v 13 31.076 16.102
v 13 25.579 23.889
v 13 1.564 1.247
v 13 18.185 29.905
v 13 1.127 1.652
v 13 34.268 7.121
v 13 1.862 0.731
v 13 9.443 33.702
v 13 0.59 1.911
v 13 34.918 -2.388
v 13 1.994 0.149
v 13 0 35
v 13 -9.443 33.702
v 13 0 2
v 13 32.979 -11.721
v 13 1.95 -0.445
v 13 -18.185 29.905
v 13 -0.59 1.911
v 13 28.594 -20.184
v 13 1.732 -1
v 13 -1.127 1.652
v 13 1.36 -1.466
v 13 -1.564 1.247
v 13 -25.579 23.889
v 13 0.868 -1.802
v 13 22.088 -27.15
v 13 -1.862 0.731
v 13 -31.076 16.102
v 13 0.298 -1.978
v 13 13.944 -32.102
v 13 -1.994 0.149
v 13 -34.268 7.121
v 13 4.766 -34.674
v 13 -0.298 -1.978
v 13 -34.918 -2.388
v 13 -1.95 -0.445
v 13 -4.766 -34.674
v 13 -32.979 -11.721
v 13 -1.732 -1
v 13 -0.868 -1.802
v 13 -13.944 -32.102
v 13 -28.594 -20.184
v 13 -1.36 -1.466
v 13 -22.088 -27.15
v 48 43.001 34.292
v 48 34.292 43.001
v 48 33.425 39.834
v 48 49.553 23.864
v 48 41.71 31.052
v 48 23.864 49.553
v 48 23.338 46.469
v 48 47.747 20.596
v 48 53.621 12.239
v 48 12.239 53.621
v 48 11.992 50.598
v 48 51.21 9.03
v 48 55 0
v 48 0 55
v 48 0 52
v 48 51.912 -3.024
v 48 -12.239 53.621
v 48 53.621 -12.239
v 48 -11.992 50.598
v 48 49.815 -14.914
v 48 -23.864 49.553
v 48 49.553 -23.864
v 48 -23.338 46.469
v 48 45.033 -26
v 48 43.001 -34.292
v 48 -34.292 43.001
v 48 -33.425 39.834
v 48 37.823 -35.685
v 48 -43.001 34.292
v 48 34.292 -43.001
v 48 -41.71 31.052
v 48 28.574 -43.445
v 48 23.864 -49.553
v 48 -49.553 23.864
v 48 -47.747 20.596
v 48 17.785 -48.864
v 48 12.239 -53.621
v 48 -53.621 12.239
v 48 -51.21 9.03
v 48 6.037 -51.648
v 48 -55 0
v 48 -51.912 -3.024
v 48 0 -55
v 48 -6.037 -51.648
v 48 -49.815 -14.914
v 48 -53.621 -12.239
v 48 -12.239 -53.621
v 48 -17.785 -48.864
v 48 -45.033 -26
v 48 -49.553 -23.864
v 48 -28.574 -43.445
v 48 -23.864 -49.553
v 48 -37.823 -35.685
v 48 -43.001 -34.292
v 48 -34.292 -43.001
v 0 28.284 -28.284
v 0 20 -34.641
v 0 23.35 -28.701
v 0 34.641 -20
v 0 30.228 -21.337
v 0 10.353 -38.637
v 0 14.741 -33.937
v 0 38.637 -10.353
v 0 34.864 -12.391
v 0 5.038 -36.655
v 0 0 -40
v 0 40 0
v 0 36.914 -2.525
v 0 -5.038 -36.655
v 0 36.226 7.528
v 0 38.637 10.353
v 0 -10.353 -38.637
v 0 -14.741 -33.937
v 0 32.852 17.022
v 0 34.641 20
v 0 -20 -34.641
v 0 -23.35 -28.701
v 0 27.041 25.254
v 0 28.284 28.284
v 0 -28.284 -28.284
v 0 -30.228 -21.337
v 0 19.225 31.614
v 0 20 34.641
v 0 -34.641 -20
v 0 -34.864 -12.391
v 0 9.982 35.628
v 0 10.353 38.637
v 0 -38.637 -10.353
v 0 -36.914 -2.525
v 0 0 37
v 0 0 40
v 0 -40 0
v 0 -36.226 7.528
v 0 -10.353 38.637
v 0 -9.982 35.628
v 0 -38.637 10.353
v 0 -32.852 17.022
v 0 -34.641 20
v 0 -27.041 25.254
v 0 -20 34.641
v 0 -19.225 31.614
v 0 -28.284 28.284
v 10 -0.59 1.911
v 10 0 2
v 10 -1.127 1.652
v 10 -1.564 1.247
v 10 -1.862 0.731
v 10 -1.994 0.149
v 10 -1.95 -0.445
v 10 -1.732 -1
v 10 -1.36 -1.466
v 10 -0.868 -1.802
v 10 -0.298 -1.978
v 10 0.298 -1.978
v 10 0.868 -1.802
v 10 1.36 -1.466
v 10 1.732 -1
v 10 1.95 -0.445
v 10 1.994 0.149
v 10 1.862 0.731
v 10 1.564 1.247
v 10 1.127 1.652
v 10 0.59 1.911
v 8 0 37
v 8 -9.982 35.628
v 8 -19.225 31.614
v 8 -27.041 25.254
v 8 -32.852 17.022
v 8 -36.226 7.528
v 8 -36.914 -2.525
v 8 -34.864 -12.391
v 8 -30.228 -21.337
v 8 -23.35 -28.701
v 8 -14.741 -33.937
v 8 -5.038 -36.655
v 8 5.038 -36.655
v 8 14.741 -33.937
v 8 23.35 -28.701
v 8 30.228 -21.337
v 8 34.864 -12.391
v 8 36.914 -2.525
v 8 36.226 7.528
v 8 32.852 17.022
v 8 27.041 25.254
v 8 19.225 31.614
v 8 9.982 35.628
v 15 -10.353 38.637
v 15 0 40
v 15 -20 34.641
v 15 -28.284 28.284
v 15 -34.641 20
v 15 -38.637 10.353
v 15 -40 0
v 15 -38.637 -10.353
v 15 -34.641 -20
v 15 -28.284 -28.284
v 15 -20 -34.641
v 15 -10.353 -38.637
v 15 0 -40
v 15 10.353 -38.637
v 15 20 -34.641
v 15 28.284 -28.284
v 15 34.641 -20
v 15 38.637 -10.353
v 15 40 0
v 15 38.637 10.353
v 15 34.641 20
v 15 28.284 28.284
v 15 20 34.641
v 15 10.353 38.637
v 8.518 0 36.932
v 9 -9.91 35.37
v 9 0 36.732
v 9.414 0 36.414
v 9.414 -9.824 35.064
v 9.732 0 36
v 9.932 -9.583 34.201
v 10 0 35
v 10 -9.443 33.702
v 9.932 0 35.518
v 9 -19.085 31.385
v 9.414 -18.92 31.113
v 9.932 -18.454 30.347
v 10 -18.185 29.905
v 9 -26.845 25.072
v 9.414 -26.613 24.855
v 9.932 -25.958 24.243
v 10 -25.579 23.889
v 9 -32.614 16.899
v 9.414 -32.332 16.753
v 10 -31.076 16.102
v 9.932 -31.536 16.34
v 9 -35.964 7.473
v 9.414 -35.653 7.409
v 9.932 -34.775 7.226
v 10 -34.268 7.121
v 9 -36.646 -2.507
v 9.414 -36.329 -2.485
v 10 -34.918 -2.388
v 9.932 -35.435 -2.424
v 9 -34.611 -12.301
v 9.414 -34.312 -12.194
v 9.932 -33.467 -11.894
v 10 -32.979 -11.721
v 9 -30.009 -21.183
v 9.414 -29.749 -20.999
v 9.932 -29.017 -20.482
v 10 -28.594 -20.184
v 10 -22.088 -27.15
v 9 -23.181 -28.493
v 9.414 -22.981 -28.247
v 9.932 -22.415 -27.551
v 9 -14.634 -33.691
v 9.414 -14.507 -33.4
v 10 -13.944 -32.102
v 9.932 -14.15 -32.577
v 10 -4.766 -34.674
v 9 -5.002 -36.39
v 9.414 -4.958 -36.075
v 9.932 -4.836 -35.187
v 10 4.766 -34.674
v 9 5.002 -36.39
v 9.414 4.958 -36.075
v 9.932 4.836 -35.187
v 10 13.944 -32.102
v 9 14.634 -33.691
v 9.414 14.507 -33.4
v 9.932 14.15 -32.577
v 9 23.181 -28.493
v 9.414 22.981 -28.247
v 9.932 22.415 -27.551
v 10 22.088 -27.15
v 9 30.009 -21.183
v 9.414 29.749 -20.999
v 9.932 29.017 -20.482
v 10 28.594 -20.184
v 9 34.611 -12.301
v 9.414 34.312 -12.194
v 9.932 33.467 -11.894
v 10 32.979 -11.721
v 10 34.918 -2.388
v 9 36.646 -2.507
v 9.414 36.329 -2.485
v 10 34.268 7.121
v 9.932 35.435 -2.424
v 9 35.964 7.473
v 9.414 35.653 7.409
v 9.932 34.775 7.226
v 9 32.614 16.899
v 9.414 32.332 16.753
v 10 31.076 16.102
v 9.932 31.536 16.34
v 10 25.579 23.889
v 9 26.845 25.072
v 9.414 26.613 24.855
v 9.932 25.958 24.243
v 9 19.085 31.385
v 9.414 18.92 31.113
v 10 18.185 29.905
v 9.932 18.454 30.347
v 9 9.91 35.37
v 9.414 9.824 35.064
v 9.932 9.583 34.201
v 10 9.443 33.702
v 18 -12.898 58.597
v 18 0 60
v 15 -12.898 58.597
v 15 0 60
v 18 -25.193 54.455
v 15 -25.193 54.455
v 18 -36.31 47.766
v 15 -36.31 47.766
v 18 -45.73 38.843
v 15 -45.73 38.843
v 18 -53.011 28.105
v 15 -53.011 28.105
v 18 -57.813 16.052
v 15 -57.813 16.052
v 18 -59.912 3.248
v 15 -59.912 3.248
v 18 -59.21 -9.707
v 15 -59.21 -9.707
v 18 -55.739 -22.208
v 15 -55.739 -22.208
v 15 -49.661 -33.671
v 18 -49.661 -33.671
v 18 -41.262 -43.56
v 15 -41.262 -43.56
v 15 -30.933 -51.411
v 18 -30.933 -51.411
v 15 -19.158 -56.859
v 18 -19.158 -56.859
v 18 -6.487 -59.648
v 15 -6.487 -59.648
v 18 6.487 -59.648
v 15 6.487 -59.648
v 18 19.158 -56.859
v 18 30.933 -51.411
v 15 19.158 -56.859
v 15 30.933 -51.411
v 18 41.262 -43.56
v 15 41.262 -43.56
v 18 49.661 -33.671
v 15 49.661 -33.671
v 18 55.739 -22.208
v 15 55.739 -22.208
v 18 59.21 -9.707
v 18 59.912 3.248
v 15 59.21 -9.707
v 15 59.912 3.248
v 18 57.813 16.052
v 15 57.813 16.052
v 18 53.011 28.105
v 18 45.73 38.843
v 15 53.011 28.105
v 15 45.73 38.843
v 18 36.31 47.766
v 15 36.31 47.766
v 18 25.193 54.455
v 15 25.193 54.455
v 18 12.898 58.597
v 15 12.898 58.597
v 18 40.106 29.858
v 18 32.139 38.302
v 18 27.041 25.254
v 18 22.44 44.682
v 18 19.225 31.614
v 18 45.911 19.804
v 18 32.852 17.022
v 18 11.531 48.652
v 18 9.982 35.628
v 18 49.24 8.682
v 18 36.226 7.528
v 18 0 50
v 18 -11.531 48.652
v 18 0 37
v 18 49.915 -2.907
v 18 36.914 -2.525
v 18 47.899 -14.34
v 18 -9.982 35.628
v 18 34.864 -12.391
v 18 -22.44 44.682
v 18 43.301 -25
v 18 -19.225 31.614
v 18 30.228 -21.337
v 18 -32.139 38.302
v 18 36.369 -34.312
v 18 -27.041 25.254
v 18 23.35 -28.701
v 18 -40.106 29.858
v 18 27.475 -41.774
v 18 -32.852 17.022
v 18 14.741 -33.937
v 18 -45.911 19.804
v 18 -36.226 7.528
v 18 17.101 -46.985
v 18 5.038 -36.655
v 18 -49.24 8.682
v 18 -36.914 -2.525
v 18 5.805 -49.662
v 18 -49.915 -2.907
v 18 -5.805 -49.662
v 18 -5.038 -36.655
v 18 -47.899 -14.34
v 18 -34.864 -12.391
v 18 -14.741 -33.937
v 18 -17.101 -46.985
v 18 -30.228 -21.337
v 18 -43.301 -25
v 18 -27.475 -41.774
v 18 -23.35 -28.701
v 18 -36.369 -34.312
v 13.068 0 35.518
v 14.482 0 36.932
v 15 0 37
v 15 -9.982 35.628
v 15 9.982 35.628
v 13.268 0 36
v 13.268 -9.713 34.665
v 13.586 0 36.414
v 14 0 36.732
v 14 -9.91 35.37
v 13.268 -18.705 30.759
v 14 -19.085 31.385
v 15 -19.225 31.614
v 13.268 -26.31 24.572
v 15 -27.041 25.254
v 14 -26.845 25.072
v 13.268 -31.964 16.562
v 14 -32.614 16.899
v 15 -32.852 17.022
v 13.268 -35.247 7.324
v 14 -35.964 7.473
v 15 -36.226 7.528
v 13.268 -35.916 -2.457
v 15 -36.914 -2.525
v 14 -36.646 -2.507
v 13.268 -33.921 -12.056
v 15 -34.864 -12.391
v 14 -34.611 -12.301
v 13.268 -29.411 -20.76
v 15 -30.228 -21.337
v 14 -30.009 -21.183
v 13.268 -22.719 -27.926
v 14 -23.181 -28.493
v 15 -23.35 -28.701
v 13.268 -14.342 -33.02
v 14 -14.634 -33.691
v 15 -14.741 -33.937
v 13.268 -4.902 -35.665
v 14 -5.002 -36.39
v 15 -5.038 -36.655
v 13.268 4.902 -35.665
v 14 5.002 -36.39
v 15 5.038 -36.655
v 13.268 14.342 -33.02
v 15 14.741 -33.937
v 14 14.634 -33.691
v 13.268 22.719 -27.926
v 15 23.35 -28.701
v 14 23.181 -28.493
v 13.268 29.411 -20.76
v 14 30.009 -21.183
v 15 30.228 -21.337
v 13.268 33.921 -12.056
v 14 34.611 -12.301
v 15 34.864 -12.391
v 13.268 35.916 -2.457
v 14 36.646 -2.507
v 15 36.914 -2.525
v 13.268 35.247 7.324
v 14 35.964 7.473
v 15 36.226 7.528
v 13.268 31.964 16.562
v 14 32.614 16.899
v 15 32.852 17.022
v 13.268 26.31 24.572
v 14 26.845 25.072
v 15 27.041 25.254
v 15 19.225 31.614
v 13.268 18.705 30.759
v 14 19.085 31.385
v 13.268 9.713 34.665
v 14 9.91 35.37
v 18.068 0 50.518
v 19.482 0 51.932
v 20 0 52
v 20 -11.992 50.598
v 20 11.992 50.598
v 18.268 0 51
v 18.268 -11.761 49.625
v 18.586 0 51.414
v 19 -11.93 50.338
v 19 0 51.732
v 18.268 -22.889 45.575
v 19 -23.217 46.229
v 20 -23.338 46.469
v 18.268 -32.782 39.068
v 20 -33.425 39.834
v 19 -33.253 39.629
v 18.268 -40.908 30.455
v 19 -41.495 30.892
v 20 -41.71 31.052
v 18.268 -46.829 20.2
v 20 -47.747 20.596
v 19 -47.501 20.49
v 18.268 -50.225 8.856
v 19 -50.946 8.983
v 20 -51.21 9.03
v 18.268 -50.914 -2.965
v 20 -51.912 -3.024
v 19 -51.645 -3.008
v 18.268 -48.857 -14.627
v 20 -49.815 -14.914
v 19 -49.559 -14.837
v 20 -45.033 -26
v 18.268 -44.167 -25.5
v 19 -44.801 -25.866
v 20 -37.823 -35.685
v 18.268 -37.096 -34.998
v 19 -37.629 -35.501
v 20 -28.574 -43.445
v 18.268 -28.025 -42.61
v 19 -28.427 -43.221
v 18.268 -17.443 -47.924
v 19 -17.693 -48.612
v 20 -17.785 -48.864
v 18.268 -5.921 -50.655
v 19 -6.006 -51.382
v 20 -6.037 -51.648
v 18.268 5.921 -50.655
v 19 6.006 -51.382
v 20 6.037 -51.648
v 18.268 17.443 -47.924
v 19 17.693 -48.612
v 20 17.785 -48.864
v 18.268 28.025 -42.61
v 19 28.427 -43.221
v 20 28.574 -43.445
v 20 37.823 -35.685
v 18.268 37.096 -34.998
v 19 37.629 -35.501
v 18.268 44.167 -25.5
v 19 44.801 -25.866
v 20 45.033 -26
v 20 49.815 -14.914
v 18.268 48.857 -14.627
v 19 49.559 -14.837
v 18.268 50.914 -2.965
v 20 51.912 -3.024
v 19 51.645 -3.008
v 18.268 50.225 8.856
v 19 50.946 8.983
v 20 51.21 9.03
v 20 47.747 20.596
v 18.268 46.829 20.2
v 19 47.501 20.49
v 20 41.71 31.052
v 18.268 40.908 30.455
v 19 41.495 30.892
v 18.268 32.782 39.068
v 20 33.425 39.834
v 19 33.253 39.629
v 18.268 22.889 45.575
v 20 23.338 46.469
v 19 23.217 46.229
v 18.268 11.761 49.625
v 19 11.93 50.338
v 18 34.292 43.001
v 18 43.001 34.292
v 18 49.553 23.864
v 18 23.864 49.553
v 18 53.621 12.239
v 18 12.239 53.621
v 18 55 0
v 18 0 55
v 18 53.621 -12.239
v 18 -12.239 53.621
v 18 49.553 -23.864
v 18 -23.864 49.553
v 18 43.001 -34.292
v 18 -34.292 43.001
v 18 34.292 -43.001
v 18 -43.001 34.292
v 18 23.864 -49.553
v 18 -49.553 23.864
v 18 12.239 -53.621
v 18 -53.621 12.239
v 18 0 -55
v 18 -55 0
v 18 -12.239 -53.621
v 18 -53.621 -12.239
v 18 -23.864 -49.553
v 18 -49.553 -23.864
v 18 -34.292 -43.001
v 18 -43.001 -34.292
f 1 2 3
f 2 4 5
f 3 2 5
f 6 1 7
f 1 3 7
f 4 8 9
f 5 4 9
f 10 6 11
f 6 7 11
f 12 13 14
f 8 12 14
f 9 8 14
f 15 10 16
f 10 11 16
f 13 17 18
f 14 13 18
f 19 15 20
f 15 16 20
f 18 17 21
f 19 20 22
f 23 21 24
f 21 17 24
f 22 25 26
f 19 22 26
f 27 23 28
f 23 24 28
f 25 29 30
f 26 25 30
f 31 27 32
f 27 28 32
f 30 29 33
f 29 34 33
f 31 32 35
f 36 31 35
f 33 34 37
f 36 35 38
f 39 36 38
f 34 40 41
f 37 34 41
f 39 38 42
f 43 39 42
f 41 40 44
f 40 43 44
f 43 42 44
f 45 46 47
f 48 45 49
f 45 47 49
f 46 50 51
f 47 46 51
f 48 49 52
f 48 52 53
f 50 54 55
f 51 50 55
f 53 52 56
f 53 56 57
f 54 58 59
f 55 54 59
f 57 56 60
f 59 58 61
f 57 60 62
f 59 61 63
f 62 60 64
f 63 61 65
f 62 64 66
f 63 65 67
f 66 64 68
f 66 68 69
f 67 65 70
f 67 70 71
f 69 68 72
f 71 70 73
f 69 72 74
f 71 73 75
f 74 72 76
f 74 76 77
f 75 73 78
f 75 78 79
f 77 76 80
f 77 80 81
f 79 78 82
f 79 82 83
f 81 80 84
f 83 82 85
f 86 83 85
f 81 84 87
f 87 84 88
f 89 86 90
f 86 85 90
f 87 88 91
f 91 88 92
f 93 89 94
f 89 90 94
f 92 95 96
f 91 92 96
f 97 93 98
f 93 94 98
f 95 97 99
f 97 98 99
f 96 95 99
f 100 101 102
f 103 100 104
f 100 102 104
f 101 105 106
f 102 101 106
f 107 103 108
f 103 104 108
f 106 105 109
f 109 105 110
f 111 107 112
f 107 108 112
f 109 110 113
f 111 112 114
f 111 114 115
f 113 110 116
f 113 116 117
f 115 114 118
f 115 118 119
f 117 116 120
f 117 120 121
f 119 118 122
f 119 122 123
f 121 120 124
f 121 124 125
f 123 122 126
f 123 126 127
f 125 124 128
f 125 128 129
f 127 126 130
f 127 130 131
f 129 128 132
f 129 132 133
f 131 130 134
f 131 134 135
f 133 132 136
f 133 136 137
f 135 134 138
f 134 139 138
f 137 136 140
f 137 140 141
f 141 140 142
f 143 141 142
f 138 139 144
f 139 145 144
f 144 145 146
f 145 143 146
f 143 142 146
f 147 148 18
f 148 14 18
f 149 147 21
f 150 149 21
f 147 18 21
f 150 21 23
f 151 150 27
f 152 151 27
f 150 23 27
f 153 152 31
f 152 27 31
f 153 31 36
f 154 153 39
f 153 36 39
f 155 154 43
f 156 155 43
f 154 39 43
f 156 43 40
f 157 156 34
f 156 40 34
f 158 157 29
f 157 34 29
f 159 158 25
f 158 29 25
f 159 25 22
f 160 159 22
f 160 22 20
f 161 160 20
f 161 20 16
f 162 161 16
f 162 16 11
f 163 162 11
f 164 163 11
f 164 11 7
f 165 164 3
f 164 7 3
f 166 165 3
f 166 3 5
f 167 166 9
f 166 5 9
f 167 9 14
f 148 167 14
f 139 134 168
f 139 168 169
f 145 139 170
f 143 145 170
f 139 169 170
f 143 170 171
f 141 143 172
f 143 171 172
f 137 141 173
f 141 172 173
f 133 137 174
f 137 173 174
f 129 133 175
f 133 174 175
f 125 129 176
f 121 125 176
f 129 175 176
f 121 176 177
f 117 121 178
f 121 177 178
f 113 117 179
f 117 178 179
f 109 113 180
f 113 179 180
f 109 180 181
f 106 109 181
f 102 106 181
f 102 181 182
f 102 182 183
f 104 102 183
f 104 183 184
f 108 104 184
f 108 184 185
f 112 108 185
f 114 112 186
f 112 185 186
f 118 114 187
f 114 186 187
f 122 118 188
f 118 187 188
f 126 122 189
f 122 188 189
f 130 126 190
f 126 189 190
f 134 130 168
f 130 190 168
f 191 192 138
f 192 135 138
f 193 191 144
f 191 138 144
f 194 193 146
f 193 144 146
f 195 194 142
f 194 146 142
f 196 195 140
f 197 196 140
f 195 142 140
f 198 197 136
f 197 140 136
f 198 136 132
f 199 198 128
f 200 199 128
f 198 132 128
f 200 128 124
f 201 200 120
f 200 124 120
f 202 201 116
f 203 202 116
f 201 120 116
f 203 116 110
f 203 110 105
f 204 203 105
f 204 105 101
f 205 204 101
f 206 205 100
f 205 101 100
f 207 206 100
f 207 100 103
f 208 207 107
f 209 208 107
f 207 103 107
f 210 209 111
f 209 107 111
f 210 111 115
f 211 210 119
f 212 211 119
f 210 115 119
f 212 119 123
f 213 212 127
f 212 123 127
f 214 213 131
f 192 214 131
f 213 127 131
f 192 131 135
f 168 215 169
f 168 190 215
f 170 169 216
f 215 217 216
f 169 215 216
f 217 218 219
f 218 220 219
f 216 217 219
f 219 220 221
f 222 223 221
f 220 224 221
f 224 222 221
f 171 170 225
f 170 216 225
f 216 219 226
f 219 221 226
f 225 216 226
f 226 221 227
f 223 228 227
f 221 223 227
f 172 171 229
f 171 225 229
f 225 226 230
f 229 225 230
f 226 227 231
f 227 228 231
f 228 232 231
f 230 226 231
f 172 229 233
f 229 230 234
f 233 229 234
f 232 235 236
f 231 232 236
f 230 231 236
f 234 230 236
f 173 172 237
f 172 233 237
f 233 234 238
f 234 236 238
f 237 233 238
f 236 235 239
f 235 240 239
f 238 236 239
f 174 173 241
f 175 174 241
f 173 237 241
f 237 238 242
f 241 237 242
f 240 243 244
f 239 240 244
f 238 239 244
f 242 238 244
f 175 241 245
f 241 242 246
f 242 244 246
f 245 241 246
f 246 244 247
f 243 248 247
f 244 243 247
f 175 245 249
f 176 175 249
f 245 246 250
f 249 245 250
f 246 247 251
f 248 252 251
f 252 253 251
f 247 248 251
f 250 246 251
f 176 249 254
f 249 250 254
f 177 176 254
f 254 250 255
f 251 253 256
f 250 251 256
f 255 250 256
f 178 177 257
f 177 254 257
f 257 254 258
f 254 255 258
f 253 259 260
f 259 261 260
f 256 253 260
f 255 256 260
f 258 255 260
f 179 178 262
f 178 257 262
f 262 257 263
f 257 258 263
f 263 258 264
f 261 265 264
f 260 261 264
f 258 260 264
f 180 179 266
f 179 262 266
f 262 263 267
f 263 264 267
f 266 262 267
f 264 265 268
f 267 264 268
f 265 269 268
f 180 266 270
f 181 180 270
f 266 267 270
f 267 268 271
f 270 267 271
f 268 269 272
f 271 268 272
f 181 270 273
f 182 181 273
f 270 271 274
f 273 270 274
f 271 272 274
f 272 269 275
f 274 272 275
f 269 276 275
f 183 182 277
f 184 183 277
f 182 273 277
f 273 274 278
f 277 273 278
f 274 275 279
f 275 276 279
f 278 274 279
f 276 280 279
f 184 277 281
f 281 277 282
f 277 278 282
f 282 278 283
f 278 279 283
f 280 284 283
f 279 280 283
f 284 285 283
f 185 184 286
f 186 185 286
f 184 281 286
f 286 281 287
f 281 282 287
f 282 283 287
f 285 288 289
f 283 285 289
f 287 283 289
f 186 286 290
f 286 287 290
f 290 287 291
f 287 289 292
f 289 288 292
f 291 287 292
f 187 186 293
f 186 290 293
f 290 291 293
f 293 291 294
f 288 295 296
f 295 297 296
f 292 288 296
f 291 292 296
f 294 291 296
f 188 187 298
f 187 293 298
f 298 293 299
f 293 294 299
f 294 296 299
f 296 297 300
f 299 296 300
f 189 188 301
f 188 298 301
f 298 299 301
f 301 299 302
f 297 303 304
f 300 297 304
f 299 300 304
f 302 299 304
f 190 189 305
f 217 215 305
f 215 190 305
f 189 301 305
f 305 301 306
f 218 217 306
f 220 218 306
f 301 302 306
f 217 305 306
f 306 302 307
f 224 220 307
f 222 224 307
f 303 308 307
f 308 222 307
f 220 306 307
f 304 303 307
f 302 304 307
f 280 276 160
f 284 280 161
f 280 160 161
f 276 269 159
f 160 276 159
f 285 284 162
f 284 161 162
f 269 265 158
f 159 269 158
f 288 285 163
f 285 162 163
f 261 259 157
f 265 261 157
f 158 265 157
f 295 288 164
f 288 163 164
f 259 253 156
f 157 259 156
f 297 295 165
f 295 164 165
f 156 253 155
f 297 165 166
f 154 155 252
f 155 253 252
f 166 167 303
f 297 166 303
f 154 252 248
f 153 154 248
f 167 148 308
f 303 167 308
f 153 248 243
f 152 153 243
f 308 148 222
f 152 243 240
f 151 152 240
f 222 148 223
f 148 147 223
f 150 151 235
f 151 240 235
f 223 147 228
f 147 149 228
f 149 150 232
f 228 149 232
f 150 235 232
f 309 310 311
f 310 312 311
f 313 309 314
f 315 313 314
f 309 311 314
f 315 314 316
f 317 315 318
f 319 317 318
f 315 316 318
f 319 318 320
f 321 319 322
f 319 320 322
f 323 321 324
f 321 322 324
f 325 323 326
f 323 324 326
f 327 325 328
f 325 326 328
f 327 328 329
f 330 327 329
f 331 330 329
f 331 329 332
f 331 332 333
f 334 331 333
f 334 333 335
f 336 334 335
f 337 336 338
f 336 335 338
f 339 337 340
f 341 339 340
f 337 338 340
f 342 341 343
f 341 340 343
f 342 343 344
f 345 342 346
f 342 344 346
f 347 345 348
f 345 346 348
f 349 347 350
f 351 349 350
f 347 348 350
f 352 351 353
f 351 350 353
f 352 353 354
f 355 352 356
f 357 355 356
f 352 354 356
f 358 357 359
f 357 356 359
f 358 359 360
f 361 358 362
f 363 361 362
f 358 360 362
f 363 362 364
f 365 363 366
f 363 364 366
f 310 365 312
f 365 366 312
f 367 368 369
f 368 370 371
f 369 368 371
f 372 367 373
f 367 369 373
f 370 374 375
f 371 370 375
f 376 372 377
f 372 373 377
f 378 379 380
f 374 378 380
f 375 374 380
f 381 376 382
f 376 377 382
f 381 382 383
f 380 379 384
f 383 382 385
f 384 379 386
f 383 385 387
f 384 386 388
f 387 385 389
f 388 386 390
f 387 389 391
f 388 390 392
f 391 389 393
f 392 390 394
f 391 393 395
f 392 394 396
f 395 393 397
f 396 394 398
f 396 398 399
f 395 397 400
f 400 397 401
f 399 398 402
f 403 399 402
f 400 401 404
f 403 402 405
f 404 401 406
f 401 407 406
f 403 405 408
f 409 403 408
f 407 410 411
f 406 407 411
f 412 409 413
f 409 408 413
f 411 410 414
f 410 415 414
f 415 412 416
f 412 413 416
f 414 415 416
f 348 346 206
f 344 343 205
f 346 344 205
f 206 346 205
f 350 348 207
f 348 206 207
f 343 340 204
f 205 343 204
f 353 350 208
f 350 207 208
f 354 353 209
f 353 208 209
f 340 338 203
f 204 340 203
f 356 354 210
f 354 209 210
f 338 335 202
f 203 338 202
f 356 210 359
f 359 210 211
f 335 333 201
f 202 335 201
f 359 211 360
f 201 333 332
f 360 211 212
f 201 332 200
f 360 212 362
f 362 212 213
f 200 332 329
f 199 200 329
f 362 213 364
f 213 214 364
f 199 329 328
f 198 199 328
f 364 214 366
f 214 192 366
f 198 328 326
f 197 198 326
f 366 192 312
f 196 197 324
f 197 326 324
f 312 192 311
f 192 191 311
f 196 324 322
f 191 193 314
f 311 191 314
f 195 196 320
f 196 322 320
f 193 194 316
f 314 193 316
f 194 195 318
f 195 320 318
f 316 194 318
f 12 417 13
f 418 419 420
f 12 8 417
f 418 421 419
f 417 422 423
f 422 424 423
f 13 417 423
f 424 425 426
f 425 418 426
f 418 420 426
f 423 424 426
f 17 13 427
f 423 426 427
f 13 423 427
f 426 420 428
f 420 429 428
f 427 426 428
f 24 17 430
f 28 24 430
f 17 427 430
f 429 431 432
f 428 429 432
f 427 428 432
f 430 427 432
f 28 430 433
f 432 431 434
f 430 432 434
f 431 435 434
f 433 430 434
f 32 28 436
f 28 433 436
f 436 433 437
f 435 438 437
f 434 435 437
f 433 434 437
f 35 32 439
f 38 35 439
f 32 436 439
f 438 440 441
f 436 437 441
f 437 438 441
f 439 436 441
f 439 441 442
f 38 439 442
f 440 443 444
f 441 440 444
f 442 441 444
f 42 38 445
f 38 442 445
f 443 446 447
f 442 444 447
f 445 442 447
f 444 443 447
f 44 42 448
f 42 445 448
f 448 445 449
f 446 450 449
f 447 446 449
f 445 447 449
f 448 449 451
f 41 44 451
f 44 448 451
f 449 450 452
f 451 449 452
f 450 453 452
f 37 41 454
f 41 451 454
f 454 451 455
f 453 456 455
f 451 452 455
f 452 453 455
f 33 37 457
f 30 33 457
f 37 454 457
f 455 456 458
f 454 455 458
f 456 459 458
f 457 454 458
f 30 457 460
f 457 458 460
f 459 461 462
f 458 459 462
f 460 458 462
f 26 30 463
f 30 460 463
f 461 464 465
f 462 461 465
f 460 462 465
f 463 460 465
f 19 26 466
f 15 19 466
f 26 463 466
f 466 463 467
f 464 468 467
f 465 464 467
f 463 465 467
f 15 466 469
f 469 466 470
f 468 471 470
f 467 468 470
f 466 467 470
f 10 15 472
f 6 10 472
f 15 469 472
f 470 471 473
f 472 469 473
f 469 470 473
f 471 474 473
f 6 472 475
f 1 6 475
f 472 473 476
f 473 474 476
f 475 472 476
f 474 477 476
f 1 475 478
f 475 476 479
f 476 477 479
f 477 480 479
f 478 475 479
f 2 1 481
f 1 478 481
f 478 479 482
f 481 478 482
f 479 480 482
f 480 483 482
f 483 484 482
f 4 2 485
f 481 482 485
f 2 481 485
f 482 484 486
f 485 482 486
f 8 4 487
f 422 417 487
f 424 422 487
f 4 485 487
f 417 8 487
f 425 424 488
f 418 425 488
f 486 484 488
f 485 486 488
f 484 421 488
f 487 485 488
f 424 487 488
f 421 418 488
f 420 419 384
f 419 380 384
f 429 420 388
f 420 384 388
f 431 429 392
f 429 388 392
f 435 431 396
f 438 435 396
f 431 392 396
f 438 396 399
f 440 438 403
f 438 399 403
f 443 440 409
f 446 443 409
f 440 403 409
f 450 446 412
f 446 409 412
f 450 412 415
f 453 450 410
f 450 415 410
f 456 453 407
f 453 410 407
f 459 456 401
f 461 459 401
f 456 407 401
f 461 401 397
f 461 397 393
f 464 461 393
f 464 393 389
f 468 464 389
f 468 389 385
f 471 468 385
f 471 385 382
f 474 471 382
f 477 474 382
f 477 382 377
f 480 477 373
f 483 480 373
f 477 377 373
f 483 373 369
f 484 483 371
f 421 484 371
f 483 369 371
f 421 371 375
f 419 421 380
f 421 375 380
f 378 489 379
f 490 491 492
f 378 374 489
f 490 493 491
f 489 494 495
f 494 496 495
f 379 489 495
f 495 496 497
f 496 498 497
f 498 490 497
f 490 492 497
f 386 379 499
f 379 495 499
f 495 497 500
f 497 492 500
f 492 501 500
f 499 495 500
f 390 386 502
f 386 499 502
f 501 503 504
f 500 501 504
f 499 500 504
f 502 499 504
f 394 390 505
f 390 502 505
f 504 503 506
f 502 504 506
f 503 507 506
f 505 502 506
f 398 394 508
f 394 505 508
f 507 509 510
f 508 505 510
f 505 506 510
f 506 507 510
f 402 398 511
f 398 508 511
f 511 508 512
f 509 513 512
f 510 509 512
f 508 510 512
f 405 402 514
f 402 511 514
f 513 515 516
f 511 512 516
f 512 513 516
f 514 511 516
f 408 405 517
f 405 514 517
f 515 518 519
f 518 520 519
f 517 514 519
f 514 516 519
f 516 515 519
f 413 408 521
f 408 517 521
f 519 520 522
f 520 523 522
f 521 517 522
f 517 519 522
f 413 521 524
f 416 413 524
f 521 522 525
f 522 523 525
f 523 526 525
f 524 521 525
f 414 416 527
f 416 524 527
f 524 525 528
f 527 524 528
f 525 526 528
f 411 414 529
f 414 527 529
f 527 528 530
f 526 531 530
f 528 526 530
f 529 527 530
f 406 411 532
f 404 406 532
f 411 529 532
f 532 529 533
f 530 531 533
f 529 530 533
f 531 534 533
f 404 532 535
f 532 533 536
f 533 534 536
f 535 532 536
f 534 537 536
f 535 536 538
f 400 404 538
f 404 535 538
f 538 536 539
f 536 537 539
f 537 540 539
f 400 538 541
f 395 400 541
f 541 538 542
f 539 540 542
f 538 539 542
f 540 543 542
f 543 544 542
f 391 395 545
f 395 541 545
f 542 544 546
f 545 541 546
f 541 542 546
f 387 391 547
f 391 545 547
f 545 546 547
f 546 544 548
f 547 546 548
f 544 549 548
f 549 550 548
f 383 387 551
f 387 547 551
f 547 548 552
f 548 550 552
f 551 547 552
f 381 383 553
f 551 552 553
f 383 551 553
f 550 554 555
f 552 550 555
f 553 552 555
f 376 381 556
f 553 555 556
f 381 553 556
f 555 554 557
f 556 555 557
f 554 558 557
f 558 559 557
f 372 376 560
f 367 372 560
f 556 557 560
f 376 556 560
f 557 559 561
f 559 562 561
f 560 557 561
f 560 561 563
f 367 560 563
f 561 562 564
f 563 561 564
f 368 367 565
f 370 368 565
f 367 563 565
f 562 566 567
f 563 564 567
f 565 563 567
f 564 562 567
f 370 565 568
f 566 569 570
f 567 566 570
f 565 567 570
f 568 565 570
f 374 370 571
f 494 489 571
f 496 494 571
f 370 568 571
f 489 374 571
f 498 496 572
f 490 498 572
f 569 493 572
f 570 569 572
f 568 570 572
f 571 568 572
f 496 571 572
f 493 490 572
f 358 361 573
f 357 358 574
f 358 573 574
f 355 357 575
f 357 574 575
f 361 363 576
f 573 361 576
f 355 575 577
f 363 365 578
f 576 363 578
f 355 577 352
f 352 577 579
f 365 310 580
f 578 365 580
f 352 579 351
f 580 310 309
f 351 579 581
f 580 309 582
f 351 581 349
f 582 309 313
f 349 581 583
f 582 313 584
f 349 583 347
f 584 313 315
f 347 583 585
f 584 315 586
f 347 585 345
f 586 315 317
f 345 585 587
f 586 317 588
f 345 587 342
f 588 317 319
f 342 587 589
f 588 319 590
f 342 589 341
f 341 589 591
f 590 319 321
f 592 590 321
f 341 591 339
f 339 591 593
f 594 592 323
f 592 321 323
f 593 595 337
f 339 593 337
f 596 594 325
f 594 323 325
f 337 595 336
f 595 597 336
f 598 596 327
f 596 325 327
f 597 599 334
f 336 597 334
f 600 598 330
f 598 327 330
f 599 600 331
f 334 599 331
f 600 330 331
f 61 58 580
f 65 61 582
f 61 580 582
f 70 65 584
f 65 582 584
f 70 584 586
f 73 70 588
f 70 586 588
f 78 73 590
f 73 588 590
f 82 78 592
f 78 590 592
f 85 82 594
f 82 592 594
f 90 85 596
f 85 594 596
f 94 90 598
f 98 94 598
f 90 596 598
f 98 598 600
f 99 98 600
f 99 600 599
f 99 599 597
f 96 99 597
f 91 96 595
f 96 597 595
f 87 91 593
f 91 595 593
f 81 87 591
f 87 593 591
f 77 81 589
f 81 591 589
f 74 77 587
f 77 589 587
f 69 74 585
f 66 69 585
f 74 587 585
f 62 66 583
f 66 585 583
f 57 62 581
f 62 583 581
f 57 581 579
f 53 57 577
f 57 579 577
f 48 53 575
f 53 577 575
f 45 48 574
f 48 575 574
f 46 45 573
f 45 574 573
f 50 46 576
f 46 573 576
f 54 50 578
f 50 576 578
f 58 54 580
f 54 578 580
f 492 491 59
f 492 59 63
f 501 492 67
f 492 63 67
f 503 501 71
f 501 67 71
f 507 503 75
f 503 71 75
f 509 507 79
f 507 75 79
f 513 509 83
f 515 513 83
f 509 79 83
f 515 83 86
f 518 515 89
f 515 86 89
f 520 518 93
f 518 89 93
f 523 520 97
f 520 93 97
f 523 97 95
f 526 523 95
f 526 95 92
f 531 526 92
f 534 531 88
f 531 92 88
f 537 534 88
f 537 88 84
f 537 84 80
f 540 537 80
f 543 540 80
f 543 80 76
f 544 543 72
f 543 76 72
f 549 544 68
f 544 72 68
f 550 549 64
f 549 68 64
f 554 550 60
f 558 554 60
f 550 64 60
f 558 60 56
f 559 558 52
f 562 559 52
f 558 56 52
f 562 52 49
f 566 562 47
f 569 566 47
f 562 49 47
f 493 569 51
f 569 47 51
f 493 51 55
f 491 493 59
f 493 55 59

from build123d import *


with BuildPart() as part:
    # Sketch1 → Revolve1 (revolve)
    with BuildSketch(Plane.XY, mode=Mode.PRIVATE) as revolve1_sk:
        with BuildLine():
            Line((0, 40), (0, 37))
            Line((0, 37), (8, 37))
            ThreePointArc((8, 37), (9.414213562, 36.414213562), (10, 35))
            Line((10, 35), (10, 2))
            Line((10, 2), (13, 2))
            Line((13, 2), (13, 35))
            ThreePointArc((13, 35), (13.585786438, 36.414213562), (15, 37))
            Line((15, 37), (18, 37))
            Line((18, 37), (18, 50))
            ThreePointArc((18, 50), (18.585786438, 51.414213562), (20, 52))
            Line((20, 52), (48, 52))
            Line((48, 52), (48, 55))
            Line((48, 55), (18, 55))
            Line((18, 55), (18, 60))
            Line((18, 60), (15, 60))
            Line((15, 60), (15, 52))
            Line((15, 52), (15, 40))
            Line((15, 40), (0, 40))
        make_face()
    revolve(revolve1_sk.sketch.rotate(Axis((0, 0, 0), (1, 0, 0)), 90), axis=Axis((0, 0, 0), (1, 0, 0)))


solid = part.part
